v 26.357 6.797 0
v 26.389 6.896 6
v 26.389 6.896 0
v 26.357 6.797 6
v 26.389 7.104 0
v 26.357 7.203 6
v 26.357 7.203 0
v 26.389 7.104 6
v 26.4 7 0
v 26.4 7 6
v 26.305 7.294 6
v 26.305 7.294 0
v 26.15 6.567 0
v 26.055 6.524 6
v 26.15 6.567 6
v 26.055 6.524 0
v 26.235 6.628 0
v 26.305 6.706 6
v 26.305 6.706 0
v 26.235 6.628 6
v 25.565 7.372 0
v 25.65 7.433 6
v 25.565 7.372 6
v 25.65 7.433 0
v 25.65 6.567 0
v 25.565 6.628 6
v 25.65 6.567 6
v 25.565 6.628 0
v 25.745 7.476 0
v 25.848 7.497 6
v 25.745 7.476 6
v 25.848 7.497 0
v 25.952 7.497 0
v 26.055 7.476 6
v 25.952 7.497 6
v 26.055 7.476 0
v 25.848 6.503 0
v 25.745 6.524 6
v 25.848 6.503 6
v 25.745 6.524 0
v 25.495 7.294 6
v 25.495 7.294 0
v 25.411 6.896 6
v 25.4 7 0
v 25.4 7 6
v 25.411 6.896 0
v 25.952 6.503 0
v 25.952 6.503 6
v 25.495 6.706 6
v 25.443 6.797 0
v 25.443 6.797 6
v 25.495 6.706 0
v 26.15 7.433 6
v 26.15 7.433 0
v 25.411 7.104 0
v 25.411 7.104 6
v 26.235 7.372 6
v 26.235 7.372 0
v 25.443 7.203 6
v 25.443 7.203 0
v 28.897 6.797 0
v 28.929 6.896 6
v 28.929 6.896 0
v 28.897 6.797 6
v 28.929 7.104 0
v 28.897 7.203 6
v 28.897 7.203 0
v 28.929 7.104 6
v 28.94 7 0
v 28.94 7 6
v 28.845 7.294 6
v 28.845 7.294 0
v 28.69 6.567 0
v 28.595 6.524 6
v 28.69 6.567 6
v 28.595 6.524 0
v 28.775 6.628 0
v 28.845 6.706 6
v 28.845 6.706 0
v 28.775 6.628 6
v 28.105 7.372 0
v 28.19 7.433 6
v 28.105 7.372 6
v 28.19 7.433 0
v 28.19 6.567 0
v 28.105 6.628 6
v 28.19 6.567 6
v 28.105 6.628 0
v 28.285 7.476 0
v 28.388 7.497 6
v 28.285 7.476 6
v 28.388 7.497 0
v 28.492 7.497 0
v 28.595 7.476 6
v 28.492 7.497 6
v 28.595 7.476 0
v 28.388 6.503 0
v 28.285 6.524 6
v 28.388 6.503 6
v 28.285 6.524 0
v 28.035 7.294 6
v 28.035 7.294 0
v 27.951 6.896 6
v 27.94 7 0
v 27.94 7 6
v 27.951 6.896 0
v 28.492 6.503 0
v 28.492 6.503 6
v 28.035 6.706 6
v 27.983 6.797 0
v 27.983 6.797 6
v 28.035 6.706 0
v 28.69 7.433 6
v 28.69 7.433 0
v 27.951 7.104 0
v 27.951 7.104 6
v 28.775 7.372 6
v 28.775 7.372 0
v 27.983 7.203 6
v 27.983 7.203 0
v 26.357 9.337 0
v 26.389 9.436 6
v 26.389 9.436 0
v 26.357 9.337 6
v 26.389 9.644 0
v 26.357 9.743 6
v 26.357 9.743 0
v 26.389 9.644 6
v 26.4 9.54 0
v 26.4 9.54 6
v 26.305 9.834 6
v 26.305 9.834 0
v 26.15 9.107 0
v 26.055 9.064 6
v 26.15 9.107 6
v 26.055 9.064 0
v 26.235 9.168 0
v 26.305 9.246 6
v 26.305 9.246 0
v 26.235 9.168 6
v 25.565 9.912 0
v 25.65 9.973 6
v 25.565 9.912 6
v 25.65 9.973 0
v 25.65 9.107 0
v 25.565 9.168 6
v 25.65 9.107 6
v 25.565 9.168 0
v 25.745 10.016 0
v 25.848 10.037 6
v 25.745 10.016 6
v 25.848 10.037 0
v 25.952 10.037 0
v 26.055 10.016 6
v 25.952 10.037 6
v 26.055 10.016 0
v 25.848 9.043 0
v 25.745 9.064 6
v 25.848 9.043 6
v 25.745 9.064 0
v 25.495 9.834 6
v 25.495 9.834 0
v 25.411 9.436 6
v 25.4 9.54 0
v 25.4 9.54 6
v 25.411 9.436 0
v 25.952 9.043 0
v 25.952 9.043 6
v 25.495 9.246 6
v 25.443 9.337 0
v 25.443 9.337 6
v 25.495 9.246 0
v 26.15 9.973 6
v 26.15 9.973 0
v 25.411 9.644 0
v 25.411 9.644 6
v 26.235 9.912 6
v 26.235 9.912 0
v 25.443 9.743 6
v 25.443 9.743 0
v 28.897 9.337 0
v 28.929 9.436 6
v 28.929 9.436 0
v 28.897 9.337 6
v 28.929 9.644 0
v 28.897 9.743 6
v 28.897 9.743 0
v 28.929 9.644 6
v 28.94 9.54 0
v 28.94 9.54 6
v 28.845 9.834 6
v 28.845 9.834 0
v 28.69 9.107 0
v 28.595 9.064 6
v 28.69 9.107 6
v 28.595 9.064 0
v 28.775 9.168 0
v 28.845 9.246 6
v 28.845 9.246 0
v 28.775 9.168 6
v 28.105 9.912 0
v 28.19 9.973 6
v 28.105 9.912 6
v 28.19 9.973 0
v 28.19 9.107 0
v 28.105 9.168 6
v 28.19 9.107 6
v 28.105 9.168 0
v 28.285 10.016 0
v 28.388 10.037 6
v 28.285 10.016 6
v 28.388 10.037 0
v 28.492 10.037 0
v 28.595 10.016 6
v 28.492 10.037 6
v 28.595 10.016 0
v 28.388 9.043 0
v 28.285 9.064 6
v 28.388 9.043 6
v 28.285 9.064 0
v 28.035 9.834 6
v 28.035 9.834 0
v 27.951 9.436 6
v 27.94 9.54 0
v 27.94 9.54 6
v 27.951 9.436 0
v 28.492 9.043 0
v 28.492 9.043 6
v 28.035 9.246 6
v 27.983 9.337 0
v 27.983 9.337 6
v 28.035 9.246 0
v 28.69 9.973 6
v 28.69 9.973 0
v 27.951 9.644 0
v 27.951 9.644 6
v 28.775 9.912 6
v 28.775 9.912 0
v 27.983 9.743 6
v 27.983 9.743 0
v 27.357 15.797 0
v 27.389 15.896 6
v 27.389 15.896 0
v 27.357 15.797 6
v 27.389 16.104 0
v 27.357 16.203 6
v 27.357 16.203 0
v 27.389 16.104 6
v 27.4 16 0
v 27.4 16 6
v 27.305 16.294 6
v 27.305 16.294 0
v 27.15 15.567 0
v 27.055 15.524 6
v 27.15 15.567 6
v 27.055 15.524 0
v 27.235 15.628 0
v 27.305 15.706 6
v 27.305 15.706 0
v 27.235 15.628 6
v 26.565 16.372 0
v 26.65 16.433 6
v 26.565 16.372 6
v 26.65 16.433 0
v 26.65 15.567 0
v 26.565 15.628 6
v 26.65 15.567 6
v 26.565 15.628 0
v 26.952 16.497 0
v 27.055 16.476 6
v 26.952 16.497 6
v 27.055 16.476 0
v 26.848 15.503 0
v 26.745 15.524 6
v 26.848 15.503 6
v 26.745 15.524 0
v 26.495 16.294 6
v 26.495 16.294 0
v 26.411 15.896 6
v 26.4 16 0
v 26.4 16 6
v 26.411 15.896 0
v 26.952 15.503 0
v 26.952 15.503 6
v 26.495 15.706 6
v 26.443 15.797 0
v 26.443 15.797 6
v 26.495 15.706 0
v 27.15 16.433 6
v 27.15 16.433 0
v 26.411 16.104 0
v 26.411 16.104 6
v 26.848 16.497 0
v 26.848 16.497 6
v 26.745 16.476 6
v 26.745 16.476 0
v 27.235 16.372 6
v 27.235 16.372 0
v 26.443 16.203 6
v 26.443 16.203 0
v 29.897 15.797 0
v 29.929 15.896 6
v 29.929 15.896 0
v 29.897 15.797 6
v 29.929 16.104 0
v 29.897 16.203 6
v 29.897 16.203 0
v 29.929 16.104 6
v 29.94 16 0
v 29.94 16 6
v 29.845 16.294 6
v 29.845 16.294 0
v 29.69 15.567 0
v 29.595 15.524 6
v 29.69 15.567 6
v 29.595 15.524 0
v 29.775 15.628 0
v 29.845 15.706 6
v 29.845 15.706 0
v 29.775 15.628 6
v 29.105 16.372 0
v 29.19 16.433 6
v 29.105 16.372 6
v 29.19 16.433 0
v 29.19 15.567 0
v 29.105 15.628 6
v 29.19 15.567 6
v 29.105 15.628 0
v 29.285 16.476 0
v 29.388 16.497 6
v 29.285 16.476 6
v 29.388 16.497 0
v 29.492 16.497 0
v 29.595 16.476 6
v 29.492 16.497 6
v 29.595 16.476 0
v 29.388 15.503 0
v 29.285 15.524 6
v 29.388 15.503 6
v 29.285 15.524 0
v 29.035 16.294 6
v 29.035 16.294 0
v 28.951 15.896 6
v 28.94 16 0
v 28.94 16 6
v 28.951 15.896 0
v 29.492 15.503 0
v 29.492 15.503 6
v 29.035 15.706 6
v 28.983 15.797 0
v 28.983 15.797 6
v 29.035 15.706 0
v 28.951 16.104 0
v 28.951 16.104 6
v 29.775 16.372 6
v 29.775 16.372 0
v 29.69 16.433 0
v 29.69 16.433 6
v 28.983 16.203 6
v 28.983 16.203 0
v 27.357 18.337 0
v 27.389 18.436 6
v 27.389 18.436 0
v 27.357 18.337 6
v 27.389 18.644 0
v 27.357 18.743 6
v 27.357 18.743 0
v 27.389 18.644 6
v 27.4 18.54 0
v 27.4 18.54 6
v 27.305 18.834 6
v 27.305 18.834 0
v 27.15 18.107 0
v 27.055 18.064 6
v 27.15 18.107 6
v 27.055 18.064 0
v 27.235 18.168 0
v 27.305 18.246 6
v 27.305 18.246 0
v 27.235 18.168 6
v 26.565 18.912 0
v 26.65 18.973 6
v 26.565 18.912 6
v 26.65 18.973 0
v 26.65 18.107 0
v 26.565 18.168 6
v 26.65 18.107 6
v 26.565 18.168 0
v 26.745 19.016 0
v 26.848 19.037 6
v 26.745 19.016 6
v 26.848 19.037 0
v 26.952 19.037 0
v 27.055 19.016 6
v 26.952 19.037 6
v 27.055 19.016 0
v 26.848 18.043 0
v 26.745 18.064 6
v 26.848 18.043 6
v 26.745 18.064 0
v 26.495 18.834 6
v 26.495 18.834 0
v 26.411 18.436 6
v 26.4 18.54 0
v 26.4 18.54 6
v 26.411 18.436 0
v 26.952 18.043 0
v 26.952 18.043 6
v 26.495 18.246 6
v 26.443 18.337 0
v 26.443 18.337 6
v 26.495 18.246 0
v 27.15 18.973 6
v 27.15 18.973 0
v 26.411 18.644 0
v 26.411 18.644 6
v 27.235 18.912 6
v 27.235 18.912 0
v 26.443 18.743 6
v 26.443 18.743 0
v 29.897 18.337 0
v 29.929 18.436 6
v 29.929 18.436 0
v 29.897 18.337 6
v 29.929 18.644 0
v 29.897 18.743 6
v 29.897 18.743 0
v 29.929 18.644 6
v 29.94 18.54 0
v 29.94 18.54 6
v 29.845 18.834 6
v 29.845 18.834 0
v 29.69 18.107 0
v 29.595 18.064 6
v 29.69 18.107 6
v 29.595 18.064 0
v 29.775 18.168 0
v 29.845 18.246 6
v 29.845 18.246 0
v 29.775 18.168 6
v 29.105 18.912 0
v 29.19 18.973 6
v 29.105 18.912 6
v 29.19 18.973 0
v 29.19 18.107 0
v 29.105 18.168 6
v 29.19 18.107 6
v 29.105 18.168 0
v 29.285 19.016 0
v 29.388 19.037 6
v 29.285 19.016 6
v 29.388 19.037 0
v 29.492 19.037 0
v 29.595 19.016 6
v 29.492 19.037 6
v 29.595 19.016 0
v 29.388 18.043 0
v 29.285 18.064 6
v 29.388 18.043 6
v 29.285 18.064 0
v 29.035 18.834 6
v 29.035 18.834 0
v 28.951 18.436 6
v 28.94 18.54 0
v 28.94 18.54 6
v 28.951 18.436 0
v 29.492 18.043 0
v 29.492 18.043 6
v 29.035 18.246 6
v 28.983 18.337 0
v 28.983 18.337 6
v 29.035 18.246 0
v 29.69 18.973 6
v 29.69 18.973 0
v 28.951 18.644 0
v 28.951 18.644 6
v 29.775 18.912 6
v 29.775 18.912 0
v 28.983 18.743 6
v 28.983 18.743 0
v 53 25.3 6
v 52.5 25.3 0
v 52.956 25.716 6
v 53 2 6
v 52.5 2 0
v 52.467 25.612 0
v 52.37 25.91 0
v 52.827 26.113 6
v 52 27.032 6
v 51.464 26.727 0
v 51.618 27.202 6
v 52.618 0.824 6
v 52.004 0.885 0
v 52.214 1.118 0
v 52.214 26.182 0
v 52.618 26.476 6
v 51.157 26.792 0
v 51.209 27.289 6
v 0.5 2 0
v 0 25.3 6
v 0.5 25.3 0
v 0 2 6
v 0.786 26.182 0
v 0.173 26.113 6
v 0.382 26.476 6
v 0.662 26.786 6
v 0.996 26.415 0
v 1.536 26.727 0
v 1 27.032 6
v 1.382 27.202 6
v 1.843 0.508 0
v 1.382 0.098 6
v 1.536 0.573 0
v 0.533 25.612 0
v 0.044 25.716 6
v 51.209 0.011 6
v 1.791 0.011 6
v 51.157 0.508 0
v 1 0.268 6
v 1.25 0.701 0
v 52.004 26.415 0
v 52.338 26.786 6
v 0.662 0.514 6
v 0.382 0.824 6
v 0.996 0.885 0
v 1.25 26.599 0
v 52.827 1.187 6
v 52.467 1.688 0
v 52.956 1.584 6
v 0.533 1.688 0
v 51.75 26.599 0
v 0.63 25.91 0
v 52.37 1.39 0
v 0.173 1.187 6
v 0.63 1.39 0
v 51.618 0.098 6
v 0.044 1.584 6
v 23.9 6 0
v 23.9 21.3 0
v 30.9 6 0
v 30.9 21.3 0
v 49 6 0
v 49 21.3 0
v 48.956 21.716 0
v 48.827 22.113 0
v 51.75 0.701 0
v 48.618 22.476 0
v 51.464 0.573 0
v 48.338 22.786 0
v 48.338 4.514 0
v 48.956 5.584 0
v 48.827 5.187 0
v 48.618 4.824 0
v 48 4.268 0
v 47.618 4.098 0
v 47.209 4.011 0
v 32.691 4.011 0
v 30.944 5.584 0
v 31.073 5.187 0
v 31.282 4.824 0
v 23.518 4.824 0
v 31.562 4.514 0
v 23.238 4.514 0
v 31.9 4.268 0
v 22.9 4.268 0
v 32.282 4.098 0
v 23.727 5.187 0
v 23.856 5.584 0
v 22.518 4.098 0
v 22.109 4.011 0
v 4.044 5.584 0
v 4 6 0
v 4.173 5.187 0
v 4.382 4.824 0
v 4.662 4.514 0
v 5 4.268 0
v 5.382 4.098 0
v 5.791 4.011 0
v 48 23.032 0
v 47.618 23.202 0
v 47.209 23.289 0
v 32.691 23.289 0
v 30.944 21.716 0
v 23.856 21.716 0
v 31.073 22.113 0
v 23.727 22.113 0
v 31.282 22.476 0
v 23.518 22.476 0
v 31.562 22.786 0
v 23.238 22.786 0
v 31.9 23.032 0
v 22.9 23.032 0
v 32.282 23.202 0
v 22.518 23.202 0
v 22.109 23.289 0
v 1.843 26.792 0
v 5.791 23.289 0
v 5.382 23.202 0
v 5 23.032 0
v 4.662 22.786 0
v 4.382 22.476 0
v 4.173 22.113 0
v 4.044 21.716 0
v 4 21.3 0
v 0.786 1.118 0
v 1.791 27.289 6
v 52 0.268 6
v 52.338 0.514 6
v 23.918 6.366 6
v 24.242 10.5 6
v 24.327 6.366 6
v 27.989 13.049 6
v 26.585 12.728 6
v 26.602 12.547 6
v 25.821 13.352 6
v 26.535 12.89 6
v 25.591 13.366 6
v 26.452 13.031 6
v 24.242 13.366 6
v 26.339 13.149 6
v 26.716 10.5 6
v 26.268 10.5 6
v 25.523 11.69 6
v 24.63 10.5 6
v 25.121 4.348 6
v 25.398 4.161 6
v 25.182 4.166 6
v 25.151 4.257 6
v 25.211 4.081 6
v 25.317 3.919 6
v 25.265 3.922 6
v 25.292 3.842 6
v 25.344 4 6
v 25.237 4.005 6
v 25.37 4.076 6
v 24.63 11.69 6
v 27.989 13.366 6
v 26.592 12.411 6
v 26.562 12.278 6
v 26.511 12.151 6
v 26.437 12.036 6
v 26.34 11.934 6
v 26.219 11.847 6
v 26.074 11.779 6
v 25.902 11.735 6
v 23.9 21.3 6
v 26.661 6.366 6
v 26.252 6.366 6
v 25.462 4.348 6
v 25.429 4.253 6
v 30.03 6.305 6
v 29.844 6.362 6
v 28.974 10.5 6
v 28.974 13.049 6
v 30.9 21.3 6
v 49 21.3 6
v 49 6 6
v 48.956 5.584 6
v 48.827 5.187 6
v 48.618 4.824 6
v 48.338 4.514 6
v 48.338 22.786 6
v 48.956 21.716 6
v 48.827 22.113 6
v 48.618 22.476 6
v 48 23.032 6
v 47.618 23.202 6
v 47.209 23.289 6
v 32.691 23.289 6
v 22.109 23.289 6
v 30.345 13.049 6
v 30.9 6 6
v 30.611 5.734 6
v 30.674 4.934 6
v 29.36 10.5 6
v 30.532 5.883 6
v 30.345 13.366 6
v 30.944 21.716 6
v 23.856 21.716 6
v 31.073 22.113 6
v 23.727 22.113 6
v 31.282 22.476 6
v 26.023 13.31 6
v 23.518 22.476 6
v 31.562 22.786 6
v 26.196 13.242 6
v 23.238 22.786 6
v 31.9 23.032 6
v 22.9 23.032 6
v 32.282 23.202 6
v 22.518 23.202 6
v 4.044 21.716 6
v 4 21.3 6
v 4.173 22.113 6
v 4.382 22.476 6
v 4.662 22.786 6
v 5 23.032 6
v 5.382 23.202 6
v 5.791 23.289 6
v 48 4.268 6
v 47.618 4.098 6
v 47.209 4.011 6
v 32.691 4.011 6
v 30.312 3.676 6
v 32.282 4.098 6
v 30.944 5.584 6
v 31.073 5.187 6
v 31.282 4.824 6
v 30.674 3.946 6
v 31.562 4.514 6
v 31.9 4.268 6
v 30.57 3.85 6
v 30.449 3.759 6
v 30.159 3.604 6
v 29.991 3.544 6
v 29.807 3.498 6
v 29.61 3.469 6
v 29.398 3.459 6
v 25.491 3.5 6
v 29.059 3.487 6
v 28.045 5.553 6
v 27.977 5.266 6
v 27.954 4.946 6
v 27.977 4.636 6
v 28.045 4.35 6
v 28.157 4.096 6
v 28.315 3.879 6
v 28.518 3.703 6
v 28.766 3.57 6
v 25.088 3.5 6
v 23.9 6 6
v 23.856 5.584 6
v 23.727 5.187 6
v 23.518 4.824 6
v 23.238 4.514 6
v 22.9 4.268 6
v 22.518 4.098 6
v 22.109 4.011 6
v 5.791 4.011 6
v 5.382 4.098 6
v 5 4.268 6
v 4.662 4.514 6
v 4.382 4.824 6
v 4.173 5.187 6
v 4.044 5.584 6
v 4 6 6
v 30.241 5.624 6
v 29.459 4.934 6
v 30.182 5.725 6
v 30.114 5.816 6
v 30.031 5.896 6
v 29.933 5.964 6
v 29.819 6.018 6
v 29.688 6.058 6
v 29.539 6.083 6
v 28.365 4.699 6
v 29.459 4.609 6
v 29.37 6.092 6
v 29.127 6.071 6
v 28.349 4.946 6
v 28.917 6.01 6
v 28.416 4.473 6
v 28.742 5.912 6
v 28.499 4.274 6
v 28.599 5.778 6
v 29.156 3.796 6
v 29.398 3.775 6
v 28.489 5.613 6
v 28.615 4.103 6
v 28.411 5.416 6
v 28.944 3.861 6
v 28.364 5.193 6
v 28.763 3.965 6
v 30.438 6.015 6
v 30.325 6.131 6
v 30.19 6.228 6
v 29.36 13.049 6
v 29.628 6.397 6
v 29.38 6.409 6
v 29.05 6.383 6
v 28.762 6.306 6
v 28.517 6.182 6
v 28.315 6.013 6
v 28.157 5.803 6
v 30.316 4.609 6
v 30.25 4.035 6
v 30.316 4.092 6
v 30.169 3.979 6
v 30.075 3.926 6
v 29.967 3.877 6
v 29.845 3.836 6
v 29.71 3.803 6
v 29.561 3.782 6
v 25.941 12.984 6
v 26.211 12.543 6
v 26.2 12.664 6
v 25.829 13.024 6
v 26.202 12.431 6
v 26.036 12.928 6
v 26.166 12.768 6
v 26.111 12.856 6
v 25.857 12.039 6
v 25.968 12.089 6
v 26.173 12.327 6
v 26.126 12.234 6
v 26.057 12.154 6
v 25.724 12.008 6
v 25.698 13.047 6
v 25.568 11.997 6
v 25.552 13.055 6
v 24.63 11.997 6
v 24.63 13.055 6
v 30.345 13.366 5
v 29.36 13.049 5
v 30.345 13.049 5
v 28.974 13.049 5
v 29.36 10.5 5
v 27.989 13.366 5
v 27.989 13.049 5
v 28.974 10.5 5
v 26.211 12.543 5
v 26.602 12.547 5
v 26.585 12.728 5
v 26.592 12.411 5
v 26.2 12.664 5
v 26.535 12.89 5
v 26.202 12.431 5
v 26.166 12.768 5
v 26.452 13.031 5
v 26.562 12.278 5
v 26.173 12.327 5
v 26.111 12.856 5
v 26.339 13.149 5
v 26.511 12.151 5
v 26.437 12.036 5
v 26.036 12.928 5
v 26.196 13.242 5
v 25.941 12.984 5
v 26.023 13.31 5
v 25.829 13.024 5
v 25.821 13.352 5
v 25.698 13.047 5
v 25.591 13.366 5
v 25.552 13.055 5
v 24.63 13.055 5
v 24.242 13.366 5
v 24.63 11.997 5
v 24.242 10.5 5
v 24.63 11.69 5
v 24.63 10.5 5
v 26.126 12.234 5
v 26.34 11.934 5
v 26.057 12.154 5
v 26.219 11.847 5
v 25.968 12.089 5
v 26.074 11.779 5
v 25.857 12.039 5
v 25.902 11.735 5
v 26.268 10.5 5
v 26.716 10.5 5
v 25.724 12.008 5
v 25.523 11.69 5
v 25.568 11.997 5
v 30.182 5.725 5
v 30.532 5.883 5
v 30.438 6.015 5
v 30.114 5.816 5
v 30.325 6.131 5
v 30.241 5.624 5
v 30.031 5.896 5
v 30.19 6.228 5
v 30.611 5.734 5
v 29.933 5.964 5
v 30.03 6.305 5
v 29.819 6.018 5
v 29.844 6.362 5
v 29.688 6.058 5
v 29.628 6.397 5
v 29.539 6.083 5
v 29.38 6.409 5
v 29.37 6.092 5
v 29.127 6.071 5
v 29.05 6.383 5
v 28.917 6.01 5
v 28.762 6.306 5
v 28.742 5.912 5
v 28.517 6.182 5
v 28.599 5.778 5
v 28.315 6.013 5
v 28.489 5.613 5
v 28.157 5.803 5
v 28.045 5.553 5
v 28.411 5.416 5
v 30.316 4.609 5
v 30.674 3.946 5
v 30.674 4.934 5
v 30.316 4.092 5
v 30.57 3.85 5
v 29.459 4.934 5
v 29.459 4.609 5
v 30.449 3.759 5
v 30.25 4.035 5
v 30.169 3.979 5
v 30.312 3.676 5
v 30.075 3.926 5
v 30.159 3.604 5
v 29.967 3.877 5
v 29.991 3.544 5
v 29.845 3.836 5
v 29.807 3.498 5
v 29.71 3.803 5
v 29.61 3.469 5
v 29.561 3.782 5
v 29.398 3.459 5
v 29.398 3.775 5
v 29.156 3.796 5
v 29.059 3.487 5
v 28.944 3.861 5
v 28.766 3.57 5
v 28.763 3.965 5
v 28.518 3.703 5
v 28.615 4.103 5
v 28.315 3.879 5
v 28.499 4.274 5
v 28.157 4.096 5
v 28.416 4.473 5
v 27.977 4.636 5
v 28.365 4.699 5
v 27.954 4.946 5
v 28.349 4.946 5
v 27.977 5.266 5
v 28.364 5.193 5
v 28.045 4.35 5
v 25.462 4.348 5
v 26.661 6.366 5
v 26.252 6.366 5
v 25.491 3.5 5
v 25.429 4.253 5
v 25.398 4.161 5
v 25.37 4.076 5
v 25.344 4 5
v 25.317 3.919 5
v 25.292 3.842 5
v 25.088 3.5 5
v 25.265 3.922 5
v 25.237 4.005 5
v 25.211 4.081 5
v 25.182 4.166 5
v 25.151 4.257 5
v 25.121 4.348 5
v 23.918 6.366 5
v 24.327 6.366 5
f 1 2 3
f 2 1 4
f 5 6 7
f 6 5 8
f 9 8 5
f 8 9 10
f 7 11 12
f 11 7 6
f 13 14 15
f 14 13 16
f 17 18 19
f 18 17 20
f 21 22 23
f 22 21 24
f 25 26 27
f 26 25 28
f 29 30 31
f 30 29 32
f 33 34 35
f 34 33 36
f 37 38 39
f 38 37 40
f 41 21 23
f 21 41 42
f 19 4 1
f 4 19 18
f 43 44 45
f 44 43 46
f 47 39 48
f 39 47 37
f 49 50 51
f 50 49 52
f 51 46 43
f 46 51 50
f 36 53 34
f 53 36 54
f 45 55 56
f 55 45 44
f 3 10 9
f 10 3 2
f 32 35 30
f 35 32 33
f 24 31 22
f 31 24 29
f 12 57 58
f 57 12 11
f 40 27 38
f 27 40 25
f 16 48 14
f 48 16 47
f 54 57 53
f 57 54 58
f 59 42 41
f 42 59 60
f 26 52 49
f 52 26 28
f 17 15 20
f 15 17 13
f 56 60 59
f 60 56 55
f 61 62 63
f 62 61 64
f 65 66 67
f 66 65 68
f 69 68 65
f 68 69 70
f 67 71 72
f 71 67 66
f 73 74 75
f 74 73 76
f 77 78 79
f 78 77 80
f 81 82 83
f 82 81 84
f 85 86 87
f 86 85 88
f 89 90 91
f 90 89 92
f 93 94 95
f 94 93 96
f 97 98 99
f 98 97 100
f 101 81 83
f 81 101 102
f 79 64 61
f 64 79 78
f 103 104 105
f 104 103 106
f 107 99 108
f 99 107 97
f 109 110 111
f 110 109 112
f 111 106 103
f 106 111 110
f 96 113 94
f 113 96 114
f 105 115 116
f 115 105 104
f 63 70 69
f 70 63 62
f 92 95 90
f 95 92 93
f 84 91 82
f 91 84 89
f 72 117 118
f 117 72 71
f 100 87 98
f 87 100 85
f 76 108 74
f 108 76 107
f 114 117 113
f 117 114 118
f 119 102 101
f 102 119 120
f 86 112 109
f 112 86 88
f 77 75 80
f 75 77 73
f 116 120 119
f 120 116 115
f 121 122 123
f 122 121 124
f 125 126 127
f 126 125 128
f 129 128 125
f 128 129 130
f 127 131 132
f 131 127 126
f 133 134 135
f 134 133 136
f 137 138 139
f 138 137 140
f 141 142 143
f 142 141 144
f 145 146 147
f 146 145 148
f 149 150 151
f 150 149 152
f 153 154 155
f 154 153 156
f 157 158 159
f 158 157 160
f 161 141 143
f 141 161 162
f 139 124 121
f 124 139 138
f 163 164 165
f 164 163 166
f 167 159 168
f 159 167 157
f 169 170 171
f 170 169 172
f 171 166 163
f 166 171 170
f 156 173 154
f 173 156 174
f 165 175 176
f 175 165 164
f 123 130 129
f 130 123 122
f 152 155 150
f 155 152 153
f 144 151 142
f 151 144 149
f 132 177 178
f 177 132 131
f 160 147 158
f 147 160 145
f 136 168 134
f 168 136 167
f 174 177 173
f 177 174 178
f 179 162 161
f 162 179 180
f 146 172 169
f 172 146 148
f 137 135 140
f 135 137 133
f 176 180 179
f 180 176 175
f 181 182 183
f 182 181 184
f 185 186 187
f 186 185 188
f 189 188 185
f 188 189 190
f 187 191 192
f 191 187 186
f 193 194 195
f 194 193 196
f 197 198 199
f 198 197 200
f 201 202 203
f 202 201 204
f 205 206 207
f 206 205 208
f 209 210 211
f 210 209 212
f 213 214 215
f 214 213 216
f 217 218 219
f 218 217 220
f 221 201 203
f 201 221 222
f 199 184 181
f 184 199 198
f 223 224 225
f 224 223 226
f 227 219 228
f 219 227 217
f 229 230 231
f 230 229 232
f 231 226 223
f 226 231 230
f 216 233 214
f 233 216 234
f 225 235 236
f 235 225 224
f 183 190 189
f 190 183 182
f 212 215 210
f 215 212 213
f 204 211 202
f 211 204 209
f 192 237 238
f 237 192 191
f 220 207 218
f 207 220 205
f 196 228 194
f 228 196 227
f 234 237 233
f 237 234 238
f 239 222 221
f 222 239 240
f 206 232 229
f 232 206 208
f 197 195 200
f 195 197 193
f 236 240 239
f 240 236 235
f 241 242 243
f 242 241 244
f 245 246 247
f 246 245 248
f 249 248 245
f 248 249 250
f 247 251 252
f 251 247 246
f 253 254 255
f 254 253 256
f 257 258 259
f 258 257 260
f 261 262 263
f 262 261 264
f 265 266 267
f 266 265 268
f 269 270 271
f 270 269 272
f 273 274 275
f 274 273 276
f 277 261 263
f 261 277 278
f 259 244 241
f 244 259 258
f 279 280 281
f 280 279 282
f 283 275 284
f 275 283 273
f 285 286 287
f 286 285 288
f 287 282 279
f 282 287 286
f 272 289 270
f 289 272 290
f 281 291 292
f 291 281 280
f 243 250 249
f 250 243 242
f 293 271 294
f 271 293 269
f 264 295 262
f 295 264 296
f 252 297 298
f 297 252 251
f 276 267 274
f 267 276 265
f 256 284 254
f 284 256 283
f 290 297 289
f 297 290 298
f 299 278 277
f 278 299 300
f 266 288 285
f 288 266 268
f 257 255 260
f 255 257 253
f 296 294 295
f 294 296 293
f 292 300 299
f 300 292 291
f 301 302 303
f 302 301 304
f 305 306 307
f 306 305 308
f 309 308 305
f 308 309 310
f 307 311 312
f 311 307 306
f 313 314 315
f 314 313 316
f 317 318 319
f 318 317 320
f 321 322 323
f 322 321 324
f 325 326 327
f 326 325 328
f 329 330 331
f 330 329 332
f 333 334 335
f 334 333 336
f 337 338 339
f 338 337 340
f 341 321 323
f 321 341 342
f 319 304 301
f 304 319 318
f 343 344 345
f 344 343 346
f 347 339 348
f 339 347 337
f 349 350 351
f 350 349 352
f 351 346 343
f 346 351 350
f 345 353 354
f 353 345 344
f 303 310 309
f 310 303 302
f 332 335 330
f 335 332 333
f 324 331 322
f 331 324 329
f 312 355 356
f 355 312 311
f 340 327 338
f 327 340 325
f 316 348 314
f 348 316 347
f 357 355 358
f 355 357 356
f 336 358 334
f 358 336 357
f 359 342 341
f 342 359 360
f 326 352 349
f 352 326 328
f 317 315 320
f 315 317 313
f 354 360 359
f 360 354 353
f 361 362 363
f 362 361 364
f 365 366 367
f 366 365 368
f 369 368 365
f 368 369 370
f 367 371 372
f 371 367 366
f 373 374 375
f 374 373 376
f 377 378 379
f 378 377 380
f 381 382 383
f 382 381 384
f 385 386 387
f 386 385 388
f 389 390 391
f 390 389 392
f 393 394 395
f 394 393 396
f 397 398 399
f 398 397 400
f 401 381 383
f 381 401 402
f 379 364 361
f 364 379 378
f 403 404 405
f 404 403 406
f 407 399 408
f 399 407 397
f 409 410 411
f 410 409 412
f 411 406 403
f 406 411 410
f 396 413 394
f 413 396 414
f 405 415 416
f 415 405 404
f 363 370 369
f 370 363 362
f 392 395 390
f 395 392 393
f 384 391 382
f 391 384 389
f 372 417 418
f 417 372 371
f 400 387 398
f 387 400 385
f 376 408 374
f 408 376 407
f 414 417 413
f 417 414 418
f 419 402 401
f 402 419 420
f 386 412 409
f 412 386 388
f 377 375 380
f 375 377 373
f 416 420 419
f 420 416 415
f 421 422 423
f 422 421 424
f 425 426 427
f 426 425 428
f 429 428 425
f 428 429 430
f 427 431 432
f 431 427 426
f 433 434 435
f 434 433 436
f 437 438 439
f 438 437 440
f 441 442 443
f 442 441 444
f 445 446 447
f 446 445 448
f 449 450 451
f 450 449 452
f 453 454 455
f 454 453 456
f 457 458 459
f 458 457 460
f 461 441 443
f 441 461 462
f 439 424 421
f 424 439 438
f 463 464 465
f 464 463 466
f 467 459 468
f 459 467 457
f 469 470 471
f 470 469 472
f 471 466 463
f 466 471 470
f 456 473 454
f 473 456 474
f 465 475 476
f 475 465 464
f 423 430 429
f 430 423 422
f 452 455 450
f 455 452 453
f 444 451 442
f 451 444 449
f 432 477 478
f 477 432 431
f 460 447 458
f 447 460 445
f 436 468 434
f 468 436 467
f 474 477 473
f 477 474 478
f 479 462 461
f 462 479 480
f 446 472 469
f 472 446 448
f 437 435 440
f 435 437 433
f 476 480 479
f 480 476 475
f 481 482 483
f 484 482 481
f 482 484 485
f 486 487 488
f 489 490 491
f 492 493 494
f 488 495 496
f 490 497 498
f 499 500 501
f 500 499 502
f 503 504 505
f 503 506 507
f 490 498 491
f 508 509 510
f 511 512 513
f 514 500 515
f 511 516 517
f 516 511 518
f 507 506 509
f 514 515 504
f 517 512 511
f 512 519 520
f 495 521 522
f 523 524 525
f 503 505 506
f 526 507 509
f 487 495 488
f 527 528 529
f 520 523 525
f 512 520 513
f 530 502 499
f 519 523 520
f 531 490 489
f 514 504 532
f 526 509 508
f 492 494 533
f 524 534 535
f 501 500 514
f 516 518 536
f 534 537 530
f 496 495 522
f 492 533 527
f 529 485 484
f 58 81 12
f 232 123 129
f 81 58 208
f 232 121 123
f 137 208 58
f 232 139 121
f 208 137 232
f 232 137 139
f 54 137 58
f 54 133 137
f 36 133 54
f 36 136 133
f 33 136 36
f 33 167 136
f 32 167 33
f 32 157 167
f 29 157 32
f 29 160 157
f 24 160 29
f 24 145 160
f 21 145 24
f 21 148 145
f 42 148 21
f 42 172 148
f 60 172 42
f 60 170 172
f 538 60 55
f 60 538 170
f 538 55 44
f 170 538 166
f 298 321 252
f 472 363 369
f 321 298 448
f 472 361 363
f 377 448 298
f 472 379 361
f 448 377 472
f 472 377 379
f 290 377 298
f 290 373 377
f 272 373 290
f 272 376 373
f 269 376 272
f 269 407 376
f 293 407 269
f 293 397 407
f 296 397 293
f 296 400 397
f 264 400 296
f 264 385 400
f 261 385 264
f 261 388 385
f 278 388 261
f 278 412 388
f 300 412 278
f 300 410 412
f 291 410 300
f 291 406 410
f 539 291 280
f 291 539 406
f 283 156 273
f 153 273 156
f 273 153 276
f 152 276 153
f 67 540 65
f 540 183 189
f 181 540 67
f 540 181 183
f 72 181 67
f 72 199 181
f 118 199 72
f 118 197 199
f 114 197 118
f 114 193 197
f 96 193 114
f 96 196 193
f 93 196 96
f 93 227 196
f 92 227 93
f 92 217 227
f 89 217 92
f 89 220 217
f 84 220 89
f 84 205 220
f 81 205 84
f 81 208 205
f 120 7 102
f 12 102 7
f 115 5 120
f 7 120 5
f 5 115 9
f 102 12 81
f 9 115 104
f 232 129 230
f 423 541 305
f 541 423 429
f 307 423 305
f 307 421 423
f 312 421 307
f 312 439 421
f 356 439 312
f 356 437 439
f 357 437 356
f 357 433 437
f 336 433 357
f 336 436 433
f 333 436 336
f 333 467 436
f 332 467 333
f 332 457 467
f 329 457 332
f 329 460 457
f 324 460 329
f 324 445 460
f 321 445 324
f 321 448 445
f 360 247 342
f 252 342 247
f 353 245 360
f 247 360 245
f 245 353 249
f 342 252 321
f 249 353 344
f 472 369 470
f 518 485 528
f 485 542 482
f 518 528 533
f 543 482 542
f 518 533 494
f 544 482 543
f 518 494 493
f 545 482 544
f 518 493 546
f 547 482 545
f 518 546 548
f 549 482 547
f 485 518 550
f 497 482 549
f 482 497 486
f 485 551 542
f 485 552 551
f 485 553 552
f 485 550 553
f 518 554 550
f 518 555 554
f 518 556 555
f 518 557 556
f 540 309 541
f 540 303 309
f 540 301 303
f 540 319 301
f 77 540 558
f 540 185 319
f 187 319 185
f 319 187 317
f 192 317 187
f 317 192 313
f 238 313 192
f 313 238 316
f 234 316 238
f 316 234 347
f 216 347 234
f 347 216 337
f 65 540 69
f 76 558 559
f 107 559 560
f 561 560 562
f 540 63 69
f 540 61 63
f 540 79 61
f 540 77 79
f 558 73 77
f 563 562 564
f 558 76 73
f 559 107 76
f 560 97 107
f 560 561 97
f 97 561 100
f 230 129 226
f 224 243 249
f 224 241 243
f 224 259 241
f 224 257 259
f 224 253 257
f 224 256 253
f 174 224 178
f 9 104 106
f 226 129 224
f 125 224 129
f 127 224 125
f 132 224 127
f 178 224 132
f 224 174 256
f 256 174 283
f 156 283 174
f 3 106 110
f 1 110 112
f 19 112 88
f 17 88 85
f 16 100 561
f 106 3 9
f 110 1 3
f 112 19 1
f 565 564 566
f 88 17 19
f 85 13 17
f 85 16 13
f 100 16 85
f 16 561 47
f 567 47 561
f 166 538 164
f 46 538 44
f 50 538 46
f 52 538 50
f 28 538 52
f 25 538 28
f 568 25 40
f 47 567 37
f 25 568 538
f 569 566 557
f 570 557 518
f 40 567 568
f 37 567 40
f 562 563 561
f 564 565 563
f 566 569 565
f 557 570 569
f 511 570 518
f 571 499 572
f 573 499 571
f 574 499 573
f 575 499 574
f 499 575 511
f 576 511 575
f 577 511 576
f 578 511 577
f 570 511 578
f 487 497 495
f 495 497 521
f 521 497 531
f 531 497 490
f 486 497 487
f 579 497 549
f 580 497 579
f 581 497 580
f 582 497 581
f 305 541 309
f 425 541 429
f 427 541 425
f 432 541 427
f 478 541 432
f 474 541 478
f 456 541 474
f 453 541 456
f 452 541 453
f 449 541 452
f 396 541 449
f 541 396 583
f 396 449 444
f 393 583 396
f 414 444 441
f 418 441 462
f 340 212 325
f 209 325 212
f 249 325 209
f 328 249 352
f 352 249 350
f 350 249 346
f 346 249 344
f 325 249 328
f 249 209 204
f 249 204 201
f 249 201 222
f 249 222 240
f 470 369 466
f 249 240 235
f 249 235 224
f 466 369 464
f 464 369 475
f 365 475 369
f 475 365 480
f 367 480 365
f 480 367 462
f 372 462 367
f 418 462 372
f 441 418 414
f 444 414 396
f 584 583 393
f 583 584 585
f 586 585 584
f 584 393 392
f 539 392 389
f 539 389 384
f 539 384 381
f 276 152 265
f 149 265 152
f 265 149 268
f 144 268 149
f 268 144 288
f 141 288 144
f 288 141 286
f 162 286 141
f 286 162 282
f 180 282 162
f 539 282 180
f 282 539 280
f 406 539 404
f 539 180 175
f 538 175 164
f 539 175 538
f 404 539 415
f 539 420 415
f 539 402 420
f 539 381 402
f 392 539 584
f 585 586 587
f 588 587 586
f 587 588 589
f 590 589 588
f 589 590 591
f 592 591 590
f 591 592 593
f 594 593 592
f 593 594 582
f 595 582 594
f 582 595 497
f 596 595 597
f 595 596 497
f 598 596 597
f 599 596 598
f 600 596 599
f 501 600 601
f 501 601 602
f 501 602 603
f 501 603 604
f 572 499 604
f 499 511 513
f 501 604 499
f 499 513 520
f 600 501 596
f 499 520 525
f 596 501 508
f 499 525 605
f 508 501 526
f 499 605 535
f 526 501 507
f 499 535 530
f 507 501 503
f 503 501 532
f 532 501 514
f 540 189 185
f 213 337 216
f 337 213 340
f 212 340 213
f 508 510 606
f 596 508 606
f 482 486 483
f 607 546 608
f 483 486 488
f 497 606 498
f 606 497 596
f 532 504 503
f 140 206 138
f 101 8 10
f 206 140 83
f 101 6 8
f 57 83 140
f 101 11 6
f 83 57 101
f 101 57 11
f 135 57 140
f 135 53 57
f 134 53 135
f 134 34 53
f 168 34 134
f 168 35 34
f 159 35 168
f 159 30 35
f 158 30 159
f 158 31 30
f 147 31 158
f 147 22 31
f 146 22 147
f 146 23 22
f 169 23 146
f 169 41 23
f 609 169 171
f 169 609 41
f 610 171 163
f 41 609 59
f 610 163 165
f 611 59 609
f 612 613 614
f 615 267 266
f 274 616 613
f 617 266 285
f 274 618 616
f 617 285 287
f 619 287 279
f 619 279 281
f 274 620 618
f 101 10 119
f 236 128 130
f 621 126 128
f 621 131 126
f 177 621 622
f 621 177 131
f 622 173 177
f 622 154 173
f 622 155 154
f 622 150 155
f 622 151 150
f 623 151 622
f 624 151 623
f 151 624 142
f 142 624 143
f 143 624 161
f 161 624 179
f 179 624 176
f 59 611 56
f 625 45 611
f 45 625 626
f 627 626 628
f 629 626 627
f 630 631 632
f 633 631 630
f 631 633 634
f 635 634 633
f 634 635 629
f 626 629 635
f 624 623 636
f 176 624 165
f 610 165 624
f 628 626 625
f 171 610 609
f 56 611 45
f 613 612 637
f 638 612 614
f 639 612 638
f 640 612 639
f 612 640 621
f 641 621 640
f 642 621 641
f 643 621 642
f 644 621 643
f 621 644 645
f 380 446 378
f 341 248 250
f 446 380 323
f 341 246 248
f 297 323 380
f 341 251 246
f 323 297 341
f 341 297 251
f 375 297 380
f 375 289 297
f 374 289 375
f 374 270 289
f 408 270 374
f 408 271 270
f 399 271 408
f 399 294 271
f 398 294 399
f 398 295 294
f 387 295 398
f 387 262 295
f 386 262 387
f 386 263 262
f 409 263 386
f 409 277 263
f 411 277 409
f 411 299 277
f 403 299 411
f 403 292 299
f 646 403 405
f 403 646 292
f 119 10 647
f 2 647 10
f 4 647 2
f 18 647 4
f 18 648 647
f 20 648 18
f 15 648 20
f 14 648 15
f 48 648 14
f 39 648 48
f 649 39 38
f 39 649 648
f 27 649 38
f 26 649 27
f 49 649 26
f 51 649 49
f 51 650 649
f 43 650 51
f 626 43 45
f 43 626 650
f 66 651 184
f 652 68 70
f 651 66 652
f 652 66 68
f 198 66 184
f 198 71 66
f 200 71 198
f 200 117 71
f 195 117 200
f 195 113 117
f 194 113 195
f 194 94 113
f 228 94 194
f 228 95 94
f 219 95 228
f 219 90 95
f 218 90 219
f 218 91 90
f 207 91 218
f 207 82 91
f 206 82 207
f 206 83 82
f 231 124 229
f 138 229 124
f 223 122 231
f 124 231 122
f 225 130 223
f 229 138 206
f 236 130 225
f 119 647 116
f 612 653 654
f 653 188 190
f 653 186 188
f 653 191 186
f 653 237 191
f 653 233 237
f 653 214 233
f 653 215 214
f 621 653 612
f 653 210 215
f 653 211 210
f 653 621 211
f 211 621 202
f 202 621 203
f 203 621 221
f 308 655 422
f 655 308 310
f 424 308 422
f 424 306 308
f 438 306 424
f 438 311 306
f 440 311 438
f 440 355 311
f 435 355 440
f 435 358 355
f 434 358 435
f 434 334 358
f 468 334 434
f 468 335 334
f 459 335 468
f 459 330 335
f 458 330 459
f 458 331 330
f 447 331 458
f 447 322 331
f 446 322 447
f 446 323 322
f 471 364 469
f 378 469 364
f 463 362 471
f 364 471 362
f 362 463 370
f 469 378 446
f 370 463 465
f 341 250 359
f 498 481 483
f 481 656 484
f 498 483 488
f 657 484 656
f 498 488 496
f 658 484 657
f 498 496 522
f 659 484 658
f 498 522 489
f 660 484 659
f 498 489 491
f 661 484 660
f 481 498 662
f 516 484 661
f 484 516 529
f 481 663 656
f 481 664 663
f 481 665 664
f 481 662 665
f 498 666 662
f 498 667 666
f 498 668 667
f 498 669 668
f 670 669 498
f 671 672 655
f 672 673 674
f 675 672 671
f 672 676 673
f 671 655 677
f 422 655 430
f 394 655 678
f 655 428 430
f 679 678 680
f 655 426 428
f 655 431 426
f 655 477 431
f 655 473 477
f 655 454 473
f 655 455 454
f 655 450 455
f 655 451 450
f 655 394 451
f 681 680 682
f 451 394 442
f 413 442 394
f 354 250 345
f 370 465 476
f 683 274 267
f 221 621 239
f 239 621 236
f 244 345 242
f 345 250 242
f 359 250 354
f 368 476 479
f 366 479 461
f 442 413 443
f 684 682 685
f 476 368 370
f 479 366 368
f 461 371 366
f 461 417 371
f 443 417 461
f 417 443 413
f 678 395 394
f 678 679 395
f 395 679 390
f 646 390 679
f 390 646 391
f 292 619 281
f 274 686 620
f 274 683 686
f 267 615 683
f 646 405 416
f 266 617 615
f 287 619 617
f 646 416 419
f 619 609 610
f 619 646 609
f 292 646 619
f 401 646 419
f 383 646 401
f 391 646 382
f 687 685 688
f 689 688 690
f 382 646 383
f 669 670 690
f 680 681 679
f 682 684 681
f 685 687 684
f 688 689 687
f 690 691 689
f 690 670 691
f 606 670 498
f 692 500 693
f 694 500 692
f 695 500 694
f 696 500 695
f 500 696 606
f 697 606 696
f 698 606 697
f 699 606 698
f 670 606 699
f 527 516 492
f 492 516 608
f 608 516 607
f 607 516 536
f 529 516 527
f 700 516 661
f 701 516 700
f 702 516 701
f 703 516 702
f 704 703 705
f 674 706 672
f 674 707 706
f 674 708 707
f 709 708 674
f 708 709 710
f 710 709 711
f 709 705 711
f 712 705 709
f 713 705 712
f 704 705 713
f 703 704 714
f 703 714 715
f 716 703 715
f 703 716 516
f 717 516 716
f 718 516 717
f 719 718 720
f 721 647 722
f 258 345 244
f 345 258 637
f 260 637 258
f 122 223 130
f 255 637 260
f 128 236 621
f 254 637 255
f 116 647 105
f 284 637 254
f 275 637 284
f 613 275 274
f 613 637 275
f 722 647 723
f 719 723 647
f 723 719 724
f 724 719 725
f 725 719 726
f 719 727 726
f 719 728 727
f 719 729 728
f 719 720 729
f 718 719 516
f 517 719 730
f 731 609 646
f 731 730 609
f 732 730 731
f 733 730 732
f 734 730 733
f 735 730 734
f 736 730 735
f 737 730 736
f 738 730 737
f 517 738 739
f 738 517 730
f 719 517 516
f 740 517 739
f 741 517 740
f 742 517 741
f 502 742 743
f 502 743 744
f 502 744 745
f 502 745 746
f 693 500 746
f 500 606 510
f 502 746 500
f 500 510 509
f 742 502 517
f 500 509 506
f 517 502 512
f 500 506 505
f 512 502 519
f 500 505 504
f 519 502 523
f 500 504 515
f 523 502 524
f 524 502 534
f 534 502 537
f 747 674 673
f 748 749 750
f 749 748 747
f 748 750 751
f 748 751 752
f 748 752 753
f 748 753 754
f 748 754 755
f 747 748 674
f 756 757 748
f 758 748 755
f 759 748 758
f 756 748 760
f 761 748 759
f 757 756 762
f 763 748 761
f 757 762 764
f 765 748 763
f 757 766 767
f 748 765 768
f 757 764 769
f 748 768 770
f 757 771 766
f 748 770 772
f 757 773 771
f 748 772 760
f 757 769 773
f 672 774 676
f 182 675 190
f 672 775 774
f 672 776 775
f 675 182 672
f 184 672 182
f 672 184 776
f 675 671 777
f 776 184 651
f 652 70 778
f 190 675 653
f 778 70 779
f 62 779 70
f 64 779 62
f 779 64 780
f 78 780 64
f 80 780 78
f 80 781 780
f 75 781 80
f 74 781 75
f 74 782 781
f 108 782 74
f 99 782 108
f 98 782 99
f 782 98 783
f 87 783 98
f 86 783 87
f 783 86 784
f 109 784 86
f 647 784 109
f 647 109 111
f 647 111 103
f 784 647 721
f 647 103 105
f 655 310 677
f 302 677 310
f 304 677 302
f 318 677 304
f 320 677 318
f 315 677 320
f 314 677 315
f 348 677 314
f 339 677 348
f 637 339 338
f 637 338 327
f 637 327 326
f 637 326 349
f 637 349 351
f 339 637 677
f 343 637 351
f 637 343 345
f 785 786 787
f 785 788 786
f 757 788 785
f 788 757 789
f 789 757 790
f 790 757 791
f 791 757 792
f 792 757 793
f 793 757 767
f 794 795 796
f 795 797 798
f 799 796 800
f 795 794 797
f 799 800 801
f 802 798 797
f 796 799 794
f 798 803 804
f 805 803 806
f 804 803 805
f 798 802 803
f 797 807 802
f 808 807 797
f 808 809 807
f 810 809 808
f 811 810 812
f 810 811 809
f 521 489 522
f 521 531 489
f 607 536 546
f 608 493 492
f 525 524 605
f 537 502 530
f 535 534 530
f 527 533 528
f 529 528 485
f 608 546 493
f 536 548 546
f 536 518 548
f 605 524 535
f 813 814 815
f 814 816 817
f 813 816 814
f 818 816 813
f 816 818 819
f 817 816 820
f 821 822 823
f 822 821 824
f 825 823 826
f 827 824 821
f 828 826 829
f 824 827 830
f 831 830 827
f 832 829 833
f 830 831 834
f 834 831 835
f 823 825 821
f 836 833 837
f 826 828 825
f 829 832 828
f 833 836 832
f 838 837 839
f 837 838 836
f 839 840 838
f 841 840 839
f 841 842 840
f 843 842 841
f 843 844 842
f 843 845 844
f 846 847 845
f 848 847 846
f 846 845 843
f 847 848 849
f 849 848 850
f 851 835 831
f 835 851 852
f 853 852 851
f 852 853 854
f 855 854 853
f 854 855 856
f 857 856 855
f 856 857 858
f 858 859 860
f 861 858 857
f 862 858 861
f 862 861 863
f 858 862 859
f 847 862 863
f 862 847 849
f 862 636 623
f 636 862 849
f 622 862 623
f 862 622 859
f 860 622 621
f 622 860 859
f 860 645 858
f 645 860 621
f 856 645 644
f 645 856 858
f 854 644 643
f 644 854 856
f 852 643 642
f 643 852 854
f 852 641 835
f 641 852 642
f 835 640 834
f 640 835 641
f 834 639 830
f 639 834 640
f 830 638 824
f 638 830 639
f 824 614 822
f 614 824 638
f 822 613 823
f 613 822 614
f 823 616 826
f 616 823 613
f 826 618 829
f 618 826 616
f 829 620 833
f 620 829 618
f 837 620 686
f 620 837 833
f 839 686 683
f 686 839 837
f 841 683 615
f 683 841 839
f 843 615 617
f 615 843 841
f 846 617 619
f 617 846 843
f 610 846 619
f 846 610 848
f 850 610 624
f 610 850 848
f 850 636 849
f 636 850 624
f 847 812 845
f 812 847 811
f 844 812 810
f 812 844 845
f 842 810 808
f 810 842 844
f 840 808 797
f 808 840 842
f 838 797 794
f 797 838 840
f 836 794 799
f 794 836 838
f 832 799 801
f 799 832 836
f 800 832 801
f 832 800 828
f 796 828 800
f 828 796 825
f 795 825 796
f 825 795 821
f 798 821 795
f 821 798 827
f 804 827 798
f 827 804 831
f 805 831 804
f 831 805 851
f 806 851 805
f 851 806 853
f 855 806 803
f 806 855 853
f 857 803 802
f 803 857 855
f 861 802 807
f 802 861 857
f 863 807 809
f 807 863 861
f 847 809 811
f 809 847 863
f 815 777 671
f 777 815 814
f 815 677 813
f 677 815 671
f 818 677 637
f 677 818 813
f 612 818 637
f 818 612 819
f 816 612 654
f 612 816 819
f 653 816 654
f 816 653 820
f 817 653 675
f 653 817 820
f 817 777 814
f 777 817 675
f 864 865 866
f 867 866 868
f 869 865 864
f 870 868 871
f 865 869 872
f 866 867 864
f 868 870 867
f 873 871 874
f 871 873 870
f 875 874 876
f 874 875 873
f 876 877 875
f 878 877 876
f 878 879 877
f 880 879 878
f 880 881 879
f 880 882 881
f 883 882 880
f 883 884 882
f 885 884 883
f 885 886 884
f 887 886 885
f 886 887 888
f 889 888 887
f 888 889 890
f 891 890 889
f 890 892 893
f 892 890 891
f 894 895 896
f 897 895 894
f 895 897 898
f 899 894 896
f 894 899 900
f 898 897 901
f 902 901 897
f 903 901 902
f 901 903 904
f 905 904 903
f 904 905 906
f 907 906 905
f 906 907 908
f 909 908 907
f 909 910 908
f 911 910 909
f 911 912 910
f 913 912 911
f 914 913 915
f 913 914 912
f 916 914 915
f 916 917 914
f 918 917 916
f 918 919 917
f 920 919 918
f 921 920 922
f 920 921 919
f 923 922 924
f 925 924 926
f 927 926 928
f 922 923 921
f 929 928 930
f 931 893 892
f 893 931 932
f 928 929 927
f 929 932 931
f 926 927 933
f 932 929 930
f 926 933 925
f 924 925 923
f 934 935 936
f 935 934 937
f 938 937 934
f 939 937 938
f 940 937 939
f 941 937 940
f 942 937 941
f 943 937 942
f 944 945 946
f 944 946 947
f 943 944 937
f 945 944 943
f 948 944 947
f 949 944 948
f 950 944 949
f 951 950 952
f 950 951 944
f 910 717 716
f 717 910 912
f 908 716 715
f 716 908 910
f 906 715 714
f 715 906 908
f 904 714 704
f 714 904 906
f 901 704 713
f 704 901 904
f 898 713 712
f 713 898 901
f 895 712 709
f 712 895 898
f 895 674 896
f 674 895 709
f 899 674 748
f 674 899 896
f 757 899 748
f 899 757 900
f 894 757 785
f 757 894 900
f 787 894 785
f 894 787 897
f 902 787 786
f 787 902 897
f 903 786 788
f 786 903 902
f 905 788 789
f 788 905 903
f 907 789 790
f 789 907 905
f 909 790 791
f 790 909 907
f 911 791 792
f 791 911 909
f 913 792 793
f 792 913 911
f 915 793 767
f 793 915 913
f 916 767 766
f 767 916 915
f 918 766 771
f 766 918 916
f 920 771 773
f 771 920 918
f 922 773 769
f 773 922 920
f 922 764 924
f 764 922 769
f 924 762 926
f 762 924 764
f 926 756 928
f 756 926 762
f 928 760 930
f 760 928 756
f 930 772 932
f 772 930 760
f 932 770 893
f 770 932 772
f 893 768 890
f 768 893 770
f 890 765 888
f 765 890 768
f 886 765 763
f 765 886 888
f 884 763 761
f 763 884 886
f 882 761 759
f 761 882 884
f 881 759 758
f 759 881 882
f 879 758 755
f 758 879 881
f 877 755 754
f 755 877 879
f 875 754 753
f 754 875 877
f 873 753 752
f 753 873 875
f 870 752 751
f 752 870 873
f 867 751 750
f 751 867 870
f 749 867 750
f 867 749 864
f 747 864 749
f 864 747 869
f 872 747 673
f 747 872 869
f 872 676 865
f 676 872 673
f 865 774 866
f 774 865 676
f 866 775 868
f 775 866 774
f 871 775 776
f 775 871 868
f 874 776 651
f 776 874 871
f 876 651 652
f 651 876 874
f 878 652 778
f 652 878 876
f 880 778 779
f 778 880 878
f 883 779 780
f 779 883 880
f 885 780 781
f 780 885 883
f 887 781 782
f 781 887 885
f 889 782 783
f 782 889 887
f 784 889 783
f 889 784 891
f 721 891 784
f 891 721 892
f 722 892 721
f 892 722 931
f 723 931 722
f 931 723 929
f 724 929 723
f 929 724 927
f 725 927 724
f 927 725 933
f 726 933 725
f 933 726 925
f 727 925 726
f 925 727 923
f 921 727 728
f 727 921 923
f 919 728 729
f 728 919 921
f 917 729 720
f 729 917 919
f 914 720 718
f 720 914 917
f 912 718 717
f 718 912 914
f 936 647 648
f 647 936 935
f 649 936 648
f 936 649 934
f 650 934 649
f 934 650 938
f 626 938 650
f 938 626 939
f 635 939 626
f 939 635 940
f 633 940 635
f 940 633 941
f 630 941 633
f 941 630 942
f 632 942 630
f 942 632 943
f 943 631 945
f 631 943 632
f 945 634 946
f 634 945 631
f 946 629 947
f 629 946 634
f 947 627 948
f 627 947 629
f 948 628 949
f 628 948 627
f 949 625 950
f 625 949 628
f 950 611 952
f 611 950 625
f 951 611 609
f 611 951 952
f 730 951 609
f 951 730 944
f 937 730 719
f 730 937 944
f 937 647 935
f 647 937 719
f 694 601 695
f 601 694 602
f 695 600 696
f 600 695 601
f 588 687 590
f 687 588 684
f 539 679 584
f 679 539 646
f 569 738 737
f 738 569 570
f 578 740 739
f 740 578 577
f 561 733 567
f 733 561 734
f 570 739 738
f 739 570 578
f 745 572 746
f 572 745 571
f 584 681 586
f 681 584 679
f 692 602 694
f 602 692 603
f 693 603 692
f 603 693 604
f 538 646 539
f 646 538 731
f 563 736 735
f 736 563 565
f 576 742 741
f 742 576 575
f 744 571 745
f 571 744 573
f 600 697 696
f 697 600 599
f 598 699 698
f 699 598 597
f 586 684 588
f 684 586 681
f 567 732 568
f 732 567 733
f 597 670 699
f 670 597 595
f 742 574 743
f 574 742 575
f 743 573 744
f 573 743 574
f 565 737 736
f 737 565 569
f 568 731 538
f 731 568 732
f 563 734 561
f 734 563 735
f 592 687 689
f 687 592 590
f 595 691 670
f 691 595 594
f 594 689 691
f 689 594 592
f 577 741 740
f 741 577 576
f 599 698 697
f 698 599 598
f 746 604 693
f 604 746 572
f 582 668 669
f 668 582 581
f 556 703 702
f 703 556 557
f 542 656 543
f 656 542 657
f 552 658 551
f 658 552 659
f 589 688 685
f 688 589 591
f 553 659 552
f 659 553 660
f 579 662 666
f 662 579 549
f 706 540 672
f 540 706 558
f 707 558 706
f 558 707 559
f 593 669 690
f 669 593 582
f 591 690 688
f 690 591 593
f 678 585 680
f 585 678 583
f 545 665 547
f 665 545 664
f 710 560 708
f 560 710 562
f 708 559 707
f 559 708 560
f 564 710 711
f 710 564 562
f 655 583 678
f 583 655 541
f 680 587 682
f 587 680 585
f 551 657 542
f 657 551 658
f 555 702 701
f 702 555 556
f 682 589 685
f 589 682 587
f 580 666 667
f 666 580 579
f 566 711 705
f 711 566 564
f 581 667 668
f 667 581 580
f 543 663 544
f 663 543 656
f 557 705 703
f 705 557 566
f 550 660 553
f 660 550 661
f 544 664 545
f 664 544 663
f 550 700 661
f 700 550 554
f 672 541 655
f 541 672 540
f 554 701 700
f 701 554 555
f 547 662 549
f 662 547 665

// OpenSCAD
/*
 * Pogo-pin programmer for the MSP430 and serial console.
 */


base_w = 53.0;
base_h = 27.3;
base_r = 2;
base_t = 6;
base_t2 = 4;

pogo_x1 = 25.9;
pogo_y1 =  7.0;
pogo_x2 = 26.9;
pogo_y2 = 16.0;
pogo_r = 1.0;


module cube_round(w,h,t,r1,r2=9)
{
	hull() {
		translate([r1,r1,0]) cylinder(r1=r1, r2=r2, h=t, $fn=30);
		translate([r1,h-r1,0]) cylinder(r1=r1, r2=r2, h=t, $fn=30);
		translate([w-r1,r1,0]) cylinder(r1=r1, r2=r2, h=t, $fn=30);
		translate([w-r1,h-r1,0]) cylinder(r1=r1, r2=r2, h=t, $fn=30);
	}
}

function inch(x) = x * 25.4;

//%cube_round(base_w, base_h, base_t, base_r);

module quad_pogo(x,y)
{
	translate([x + inch(0.0), y + inch(0.0), -1]) cylinder(d=pogo_r, h=20, $fn=30);
	translate([x + inch(0.1), y + inch(0.0), -1]) cylinder(d=pogo_r, h=20, $fn=30);
	translate([x + inch(0.0), y + inch(0.1), -1]) cylinder(d=pogo_r, h=20, $fn=30);
	translate([x + inch(0.1), y + inch(0.1), -1]) cylinder(d=pogo_r, h=20, $fn=30);
}

render() difference()
{
	translate([0,0,base_t]) mirror([0,0,1])
	cube_round(base_w, base_h, base_t, base_r, base_r-0.5);

	quad_pogo(pogo_x1, pogo_y1);
	quad_pogo(pogo_x2, pogo_y2);

	translate([pogo_x1-2, pogo_y1 + 3.5, base_t-1]) linear_extrude(height=2) text("R T", size=3);
	translate([pogo_x1-2, pogo_y1 - 3.5, base_t-1]) linear_extrude(height=2) text("V G", size=3);

	translate([base_t2, base_t2, -1]) cube_round(pogo_x1 - base_t2*1.5, base_h - 2*base_t2, base_t + 2, base_r, base_r);
	translate([pogo_x1 + 5, base_t2, -1]) cube_round(base_w - pogo_x1 - base_t2 - 5, base_h - 2*base_t2, base_t + 2, base_r, base_r);
	//translate([base_t, base_t, -1]) cube_round(base_w - 2*base_t, base_h - 2*base_t, base_t + 2, base_r, base_r);

	//translate([base_r/2, base_h - 4, base_t-0.5]) linear_extrude(height=2) text("e-ink programmer", size=3);
}
